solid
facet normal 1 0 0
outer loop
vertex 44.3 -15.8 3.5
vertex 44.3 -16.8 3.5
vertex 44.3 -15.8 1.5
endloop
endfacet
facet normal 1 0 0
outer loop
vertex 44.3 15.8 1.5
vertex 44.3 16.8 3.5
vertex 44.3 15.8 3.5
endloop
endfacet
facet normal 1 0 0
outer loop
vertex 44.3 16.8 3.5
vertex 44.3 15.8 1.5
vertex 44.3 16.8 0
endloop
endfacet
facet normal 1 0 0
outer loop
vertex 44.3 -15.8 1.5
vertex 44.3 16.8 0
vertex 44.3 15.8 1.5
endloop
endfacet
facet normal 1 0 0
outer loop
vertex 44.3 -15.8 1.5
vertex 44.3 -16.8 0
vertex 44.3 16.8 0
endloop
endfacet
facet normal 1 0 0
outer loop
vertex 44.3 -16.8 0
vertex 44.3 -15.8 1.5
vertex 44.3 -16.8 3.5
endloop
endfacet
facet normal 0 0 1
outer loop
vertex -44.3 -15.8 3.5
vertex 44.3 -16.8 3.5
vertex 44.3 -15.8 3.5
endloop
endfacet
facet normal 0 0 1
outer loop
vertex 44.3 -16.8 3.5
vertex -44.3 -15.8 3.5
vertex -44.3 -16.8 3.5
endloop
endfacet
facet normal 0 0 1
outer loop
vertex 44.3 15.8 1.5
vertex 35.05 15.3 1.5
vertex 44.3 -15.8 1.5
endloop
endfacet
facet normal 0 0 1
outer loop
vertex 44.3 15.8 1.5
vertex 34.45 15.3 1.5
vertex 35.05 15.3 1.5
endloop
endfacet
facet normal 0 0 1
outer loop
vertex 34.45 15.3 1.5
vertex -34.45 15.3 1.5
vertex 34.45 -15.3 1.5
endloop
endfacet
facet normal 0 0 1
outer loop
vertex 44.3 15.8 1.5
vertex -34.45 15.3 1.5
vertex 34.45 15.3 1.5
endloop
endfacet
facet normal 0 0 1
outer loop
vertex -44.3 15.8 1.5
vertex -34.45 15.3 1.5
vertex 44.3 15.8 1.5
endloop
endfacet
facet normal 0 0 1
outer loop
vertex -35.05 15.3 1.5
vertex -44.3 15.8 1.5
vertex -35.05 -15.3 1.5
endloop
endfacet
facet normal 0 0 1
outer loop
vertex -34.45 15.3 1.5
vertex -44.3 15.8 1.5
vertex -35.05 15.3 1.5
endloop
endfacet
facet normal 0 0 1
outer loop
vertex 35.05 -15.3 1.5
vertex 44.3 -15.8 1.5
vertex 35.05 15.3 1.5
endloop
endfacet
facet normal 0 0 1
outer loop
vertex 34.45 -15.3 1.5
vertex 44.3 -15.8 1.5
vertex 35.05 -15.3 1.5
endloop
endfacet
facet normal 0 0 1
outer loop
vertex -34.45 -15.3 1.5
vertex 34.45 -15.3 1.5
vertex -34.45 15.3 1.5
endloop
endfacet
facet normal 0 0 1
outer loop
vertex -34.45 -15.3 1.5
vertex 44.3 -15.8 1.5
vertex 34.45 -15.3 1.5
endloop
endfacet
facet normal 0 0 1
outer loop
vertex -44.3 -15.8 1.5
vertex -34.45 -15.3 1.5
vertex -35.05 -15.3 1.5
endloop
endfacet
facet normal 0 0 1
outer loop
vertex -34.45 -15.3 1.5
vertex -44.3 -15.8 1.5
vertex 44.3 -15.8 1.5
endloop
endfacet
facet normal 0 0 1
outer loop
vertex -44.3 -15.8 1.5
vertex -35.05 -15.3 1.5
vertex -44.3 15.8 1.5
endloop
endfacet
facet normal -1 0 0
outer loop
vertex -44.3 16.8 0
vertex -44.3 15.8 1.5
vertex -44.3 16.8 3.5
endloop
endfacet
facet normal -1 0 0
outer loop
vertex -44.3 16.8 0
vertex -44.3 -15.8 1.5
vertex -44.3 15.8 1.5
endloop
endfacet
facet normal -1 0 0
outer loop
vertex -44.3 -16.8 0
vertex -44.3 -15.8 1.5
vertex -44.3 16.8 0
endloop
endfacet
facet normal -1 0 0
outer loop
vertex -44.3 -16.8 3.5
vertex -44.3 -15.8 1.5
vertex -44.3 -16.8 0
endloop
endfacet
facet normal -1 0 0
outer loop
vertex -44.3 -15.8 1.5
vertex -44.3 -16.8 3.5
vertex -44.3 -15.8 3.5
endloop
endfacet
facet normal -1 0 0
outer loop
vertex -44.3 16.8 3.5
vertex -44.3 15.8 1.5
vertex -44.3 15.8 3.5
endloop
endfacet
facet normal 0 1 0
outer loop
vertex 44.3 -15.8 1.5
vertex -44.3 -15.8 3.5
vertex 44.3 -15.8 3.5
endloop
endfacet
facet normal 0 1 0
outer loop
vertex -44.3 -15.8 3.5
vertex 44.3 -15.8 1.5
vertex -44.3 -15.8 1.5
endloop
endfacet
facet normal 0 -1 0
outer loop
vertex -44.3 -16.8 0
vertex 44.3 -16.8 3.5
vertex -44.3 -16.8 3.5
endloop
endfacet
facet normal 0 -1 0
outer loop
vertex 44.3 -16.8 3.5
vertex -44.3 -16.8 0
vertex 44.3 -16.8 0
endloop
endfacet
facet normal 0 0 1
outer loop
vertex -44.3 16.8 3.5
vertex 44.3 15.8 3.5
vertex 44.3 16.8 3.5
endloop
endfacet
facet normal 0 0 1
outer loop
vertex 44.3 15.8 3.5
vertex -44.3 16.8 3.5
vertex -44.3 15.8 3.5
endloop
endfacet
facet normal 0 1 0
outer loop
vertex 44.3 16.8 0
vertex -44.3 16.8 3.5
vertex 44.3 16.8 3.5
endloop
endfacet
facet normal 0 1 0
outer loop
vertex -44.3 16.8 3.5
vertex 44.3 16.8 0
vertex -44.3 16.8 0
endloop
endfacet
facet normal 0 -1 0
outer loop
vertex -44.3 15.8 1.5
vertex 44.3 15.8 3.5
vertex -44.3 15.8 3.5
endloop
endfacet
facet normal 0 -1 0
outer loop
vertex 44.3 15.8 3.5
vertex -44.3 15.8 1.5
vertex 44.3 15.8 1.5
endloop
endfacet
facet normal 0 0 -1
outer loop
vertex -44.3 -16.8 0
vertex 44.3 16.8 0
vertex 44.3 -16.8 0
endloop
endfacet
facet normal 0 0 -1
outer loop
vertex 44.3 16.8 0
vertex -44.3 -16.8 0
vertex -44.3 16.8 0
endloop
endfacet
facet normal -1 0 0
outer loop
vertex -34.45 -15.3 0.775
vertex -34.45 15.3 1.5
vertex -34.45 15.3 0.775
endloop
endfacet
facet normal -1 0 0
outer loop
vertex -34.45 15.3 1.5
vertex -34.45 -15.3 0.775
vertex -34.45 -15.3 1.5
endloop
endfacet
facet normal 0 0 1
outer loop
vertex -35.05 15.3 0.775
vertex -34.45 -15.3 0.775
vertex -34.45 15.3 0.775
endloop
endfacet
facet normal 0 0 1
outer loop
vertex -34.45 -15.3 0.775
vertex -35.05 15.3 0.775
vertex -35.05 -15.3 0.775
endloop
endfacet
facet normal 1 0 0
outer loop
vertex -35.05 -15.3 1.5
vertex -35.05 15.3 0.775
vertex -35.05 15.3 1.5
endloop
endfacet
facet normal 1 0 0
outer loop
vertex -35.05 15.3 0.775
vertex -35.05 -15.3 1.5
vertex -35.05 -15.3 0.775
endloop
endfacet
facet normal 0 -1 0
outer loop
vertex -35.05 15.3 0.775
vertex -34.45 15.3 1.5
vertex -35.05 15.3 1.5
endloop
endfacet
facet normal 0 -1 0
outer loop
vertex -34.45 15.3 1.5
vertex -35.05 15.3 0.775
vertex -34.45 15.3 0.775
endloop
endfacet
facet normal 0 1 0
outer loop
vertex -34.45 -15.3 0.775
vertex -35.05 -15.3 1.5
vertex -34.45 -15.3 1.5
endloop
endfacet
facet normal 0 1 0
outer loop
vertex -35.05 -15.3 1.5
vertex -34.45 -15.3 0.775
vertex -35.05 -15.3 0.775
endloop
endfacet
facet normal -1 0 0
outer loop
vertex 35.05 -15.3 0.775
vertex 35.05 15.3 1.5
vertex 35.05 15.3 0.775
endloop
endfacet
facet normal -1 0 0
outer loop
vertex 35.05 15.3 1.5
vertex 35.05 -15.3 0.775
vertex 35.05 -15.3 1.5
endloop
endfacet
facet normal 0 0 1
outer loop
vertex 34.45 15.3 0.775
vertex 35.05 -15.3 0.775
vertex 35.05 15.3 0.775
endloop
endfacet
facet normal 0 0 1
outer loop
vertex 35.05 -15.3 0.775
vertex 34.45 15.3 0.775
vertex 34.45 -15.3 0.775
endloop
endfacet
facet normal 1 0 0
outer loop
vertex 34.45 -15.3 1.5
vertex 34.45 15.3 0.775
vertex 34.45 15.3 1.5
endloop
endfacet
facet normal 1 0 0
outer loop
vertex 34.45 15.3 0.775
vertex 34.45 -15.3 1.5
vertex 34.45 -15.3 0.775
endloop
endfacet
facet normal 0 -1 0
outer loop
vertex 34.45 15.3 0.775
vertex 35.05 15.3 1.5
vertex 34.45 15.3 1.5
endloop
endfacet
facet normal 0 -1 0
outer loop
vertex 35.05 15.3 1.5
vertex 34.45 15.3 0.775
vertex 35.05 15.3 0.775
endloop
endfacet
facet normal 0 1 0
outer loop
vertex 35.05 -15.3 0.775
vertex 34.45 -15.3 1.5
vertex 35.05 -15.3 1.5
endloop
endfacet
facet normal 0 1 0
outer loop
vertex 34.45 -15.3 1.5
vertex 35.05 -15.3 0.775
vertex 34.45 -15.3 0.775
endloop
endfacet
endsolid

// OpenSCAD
// Mini-Waymo micro: dimension-test tray ONLY.
// NOT a production chassis or verified match to any Waymo collectible.
// Open shell, measure usable interior, wheel wells, axle offsets and fastener mounts.
// Then update parameters before printing. Print at 100% scale.
// Shell OUTSIDE (Waymo shop): 112 x 45.6 x 51.2 mm incl. roof dome, about 1:42. Inside still unmeasured.
inside_length_mm = 90; // PLACEHOLDER
inside_width_mm = 35;   // PLACEHOLDER
tray_clearance_mm = 0.7; // radial allowance all sides
floor_thickness_mm = 1.5;
edge_lip_height_mm = 2.0;
edge_lip_wall_mm = 1.0;
wheelbase_mm = 69.5; // placeholder; about 71.5 if the shell is 1:42

length = inside_length_mm - 2*tray_clearance_mm;
width  = inside_width_mm - 2*tray_clearance_mm;
assert(length>30 && width>10,"Dimensions too small");
difference(){
 union(){
  translate([-length/2,-width/2,0])cube([length,width,floor_thickness_mm]);
  for(y=[-width/2,width/2-edge_lip_wall_mm])
    translate([-length/2,y,floor_thickness_mm])cube([length,edge_lip_wall_mm,edge_lip_height_mm]);
 }
 // No drive-shaft holes until measured; markers are shallow engraving.
 for(x=[-wheelbase_mm/2,wheelbase_mm/2])
   translate([x,0,floor_thickness_mm-0.35])cube([.6,width-3,.75],center=true);
}
